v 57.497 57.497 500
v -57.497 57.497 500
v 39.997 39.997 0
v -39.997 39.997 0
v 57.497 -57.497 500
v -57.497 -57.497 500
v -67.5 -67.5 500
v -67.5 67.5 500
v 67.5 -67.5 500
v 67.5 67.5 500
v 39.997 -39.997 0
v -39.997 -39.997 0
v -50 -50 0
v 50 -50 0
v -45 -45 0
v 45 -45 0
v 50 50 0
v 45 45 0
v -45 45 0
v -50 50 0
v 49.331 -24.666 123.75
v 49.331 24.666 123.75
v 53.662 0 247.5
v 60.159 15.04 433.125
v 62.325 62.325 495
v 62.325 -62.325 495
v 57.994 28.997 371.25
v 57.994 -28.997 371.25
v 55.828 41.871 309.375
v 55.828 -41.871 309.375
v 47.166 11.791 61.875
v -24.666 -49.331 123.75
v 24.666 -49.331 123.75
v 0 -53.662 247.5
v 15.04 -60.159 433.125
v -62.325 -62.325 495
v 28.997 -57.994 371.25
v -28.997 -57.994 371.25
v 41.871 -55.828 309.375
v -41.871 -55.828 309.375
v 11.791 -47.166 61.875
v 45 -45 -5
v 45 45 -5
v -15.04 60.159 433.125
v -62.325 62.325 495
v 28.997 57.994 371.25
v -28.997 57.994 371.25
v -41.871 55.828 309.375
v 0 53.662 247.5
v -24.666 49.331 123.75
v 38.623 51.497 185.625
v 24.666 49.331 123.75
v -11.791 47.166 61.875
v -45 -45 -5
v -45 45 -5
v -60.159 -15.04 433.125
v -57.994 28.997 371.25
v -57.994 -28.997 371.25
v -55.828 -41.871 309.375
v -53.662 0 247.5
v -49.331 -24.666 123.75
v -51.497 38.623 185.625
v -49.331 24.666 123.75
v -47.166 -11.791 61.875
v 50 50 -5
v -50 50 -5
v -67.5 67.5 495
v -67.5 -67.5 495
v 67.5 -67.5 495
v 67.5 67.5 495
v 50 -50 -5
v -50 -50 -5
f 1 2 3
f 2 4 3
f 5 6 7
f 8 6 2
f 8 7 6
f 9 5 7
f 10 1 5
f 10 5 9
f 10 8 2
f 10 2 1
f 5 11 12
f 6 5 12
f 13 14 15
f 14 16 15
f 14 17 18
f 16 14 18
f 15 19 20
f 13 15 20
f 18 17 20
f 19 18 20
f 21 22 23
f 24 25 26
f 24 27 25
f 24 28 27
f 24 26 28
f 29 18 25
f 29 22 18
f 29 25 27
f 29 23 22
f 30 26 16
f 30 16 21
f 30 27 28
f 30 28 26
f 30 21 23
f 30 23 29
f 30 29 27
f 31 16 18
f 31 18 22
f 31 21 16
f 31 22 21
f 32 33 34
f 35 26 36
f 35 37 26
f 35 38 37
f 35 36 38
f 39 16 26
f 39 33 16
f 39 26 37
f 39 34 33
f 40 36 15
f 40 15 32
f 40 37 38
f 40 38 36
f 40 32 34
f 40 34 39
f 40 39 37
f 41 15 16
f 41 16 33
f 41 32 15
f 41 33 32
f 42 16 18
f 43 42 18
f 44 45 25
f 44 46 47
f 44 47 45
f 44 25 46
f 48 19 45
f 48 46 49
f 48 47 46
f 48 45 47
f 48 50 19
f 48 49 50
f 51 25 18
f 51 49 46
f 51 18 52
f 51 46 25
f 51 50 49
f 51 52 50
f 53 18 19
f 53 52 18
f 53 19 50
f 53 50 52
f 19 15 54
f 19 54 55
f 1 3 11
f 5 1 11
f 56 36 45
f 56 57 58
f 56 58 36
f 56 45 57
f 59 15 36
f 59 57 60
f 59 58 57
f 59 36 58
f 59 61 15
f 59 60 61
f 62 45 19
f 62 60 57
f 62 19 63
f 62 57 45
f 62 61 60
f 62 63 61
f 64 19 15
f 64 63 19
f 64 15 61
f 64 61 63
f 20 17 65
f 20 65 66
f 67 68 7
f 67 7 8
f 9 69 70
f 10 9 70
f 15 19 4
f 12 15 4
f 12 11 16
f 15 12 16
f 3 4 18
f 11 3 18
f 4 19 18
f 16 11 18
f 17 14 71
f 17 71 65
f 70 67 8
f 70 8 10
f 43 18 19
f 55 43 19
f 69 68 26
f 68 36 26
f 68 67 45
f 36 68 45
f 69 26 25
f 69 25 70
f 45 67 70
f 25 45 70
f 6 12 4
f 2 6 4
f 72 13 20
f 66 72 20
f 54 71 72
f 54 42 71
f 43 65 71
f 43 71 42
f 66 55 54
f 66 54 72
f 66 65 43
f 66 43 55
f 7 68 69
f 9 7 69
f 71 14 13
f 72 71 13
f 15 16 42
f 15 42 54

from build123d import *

# Parameters (mm, degrees)
SHELL2_T            = -5
SKETCH5_W           = 100
SKETCH5_H           = 100
SKETCH5_W_2         = 90
SKETCH5_H_2         = 90
BOSS_EXTRUDE1_DEPTH = 5
SKETCH6_W           = 135
SKETCH6_H           = 135
SKETCH6_W_2         = 114.993876874
SKETCH6_H_2         = 114.993876874
BOSS_EXTRUDE2_DEPTH = 5


with BuildPart() as part:
    # Sketch4 → Loft2 section 0
    with BuildSketch(Plane.XY.offset(500)):
        with BuildLine():
            Line((-62.5, 62.5), (62.5, 62.5))
            Line((62.5, 62.5), (62.5, -62.5))
            Line((62.5, -62.5), (-62.5, -62.5))
            Line((-62.5, -62.5), (-62.5, 62.5))
        make_face()
    # Sketch1 → Loft2 section 1
    with BuildSketch(Plane.XY):
        with BuildLine():
            Line((-45, 45), (45, 45))
            Line((45, 45), (45, -45))
            Line((45, -45), (-45, -45))
            Line((-45, -45), (-45, 45))
        make_face()
    loft()

    # Shell2
    shell2_openings = [part.faces().sort_by_distance(p)[0] for p in [
        (0, 0, 0),
        (0, 0, 500),
    ]]
    offset(amount=SHELL2_T, openings=shell2_openings, kind=Kind.INTERSECTION)

    # Sketch6 → Boss-Extrude2 (add)
    with BuildSketch(Plane.XY.offset(500)):
        Rectangle(SKETCH6_W, SKETCH6_H)
        Rectangle(SKETCH6_W_2, SKETCH6_H_2, mode=Mode.SUBTRACT)
    extrude(amount=-BOSS_EXTRUDE2_DEPTH)


with BuildPart() as body_2:
    # Sketch5 → Boss-Extrude1 (new body)
    with BuildSketch(Plane(origin=(0, 0, 0), x_dir=(-1, 0, 0), z_dir=(0, 0, -1))):
        Rectangle(SKETCH5_W, SKETCH5_H)
        Rectangle(SKETCH5_W_2, SKETCH5_H_2, mode=Mode.SUBTRACT)
    extrude(amount=BOSS_EXTRUDE1_DEPTH)


solid = Compound([part.part, body_2.part])
